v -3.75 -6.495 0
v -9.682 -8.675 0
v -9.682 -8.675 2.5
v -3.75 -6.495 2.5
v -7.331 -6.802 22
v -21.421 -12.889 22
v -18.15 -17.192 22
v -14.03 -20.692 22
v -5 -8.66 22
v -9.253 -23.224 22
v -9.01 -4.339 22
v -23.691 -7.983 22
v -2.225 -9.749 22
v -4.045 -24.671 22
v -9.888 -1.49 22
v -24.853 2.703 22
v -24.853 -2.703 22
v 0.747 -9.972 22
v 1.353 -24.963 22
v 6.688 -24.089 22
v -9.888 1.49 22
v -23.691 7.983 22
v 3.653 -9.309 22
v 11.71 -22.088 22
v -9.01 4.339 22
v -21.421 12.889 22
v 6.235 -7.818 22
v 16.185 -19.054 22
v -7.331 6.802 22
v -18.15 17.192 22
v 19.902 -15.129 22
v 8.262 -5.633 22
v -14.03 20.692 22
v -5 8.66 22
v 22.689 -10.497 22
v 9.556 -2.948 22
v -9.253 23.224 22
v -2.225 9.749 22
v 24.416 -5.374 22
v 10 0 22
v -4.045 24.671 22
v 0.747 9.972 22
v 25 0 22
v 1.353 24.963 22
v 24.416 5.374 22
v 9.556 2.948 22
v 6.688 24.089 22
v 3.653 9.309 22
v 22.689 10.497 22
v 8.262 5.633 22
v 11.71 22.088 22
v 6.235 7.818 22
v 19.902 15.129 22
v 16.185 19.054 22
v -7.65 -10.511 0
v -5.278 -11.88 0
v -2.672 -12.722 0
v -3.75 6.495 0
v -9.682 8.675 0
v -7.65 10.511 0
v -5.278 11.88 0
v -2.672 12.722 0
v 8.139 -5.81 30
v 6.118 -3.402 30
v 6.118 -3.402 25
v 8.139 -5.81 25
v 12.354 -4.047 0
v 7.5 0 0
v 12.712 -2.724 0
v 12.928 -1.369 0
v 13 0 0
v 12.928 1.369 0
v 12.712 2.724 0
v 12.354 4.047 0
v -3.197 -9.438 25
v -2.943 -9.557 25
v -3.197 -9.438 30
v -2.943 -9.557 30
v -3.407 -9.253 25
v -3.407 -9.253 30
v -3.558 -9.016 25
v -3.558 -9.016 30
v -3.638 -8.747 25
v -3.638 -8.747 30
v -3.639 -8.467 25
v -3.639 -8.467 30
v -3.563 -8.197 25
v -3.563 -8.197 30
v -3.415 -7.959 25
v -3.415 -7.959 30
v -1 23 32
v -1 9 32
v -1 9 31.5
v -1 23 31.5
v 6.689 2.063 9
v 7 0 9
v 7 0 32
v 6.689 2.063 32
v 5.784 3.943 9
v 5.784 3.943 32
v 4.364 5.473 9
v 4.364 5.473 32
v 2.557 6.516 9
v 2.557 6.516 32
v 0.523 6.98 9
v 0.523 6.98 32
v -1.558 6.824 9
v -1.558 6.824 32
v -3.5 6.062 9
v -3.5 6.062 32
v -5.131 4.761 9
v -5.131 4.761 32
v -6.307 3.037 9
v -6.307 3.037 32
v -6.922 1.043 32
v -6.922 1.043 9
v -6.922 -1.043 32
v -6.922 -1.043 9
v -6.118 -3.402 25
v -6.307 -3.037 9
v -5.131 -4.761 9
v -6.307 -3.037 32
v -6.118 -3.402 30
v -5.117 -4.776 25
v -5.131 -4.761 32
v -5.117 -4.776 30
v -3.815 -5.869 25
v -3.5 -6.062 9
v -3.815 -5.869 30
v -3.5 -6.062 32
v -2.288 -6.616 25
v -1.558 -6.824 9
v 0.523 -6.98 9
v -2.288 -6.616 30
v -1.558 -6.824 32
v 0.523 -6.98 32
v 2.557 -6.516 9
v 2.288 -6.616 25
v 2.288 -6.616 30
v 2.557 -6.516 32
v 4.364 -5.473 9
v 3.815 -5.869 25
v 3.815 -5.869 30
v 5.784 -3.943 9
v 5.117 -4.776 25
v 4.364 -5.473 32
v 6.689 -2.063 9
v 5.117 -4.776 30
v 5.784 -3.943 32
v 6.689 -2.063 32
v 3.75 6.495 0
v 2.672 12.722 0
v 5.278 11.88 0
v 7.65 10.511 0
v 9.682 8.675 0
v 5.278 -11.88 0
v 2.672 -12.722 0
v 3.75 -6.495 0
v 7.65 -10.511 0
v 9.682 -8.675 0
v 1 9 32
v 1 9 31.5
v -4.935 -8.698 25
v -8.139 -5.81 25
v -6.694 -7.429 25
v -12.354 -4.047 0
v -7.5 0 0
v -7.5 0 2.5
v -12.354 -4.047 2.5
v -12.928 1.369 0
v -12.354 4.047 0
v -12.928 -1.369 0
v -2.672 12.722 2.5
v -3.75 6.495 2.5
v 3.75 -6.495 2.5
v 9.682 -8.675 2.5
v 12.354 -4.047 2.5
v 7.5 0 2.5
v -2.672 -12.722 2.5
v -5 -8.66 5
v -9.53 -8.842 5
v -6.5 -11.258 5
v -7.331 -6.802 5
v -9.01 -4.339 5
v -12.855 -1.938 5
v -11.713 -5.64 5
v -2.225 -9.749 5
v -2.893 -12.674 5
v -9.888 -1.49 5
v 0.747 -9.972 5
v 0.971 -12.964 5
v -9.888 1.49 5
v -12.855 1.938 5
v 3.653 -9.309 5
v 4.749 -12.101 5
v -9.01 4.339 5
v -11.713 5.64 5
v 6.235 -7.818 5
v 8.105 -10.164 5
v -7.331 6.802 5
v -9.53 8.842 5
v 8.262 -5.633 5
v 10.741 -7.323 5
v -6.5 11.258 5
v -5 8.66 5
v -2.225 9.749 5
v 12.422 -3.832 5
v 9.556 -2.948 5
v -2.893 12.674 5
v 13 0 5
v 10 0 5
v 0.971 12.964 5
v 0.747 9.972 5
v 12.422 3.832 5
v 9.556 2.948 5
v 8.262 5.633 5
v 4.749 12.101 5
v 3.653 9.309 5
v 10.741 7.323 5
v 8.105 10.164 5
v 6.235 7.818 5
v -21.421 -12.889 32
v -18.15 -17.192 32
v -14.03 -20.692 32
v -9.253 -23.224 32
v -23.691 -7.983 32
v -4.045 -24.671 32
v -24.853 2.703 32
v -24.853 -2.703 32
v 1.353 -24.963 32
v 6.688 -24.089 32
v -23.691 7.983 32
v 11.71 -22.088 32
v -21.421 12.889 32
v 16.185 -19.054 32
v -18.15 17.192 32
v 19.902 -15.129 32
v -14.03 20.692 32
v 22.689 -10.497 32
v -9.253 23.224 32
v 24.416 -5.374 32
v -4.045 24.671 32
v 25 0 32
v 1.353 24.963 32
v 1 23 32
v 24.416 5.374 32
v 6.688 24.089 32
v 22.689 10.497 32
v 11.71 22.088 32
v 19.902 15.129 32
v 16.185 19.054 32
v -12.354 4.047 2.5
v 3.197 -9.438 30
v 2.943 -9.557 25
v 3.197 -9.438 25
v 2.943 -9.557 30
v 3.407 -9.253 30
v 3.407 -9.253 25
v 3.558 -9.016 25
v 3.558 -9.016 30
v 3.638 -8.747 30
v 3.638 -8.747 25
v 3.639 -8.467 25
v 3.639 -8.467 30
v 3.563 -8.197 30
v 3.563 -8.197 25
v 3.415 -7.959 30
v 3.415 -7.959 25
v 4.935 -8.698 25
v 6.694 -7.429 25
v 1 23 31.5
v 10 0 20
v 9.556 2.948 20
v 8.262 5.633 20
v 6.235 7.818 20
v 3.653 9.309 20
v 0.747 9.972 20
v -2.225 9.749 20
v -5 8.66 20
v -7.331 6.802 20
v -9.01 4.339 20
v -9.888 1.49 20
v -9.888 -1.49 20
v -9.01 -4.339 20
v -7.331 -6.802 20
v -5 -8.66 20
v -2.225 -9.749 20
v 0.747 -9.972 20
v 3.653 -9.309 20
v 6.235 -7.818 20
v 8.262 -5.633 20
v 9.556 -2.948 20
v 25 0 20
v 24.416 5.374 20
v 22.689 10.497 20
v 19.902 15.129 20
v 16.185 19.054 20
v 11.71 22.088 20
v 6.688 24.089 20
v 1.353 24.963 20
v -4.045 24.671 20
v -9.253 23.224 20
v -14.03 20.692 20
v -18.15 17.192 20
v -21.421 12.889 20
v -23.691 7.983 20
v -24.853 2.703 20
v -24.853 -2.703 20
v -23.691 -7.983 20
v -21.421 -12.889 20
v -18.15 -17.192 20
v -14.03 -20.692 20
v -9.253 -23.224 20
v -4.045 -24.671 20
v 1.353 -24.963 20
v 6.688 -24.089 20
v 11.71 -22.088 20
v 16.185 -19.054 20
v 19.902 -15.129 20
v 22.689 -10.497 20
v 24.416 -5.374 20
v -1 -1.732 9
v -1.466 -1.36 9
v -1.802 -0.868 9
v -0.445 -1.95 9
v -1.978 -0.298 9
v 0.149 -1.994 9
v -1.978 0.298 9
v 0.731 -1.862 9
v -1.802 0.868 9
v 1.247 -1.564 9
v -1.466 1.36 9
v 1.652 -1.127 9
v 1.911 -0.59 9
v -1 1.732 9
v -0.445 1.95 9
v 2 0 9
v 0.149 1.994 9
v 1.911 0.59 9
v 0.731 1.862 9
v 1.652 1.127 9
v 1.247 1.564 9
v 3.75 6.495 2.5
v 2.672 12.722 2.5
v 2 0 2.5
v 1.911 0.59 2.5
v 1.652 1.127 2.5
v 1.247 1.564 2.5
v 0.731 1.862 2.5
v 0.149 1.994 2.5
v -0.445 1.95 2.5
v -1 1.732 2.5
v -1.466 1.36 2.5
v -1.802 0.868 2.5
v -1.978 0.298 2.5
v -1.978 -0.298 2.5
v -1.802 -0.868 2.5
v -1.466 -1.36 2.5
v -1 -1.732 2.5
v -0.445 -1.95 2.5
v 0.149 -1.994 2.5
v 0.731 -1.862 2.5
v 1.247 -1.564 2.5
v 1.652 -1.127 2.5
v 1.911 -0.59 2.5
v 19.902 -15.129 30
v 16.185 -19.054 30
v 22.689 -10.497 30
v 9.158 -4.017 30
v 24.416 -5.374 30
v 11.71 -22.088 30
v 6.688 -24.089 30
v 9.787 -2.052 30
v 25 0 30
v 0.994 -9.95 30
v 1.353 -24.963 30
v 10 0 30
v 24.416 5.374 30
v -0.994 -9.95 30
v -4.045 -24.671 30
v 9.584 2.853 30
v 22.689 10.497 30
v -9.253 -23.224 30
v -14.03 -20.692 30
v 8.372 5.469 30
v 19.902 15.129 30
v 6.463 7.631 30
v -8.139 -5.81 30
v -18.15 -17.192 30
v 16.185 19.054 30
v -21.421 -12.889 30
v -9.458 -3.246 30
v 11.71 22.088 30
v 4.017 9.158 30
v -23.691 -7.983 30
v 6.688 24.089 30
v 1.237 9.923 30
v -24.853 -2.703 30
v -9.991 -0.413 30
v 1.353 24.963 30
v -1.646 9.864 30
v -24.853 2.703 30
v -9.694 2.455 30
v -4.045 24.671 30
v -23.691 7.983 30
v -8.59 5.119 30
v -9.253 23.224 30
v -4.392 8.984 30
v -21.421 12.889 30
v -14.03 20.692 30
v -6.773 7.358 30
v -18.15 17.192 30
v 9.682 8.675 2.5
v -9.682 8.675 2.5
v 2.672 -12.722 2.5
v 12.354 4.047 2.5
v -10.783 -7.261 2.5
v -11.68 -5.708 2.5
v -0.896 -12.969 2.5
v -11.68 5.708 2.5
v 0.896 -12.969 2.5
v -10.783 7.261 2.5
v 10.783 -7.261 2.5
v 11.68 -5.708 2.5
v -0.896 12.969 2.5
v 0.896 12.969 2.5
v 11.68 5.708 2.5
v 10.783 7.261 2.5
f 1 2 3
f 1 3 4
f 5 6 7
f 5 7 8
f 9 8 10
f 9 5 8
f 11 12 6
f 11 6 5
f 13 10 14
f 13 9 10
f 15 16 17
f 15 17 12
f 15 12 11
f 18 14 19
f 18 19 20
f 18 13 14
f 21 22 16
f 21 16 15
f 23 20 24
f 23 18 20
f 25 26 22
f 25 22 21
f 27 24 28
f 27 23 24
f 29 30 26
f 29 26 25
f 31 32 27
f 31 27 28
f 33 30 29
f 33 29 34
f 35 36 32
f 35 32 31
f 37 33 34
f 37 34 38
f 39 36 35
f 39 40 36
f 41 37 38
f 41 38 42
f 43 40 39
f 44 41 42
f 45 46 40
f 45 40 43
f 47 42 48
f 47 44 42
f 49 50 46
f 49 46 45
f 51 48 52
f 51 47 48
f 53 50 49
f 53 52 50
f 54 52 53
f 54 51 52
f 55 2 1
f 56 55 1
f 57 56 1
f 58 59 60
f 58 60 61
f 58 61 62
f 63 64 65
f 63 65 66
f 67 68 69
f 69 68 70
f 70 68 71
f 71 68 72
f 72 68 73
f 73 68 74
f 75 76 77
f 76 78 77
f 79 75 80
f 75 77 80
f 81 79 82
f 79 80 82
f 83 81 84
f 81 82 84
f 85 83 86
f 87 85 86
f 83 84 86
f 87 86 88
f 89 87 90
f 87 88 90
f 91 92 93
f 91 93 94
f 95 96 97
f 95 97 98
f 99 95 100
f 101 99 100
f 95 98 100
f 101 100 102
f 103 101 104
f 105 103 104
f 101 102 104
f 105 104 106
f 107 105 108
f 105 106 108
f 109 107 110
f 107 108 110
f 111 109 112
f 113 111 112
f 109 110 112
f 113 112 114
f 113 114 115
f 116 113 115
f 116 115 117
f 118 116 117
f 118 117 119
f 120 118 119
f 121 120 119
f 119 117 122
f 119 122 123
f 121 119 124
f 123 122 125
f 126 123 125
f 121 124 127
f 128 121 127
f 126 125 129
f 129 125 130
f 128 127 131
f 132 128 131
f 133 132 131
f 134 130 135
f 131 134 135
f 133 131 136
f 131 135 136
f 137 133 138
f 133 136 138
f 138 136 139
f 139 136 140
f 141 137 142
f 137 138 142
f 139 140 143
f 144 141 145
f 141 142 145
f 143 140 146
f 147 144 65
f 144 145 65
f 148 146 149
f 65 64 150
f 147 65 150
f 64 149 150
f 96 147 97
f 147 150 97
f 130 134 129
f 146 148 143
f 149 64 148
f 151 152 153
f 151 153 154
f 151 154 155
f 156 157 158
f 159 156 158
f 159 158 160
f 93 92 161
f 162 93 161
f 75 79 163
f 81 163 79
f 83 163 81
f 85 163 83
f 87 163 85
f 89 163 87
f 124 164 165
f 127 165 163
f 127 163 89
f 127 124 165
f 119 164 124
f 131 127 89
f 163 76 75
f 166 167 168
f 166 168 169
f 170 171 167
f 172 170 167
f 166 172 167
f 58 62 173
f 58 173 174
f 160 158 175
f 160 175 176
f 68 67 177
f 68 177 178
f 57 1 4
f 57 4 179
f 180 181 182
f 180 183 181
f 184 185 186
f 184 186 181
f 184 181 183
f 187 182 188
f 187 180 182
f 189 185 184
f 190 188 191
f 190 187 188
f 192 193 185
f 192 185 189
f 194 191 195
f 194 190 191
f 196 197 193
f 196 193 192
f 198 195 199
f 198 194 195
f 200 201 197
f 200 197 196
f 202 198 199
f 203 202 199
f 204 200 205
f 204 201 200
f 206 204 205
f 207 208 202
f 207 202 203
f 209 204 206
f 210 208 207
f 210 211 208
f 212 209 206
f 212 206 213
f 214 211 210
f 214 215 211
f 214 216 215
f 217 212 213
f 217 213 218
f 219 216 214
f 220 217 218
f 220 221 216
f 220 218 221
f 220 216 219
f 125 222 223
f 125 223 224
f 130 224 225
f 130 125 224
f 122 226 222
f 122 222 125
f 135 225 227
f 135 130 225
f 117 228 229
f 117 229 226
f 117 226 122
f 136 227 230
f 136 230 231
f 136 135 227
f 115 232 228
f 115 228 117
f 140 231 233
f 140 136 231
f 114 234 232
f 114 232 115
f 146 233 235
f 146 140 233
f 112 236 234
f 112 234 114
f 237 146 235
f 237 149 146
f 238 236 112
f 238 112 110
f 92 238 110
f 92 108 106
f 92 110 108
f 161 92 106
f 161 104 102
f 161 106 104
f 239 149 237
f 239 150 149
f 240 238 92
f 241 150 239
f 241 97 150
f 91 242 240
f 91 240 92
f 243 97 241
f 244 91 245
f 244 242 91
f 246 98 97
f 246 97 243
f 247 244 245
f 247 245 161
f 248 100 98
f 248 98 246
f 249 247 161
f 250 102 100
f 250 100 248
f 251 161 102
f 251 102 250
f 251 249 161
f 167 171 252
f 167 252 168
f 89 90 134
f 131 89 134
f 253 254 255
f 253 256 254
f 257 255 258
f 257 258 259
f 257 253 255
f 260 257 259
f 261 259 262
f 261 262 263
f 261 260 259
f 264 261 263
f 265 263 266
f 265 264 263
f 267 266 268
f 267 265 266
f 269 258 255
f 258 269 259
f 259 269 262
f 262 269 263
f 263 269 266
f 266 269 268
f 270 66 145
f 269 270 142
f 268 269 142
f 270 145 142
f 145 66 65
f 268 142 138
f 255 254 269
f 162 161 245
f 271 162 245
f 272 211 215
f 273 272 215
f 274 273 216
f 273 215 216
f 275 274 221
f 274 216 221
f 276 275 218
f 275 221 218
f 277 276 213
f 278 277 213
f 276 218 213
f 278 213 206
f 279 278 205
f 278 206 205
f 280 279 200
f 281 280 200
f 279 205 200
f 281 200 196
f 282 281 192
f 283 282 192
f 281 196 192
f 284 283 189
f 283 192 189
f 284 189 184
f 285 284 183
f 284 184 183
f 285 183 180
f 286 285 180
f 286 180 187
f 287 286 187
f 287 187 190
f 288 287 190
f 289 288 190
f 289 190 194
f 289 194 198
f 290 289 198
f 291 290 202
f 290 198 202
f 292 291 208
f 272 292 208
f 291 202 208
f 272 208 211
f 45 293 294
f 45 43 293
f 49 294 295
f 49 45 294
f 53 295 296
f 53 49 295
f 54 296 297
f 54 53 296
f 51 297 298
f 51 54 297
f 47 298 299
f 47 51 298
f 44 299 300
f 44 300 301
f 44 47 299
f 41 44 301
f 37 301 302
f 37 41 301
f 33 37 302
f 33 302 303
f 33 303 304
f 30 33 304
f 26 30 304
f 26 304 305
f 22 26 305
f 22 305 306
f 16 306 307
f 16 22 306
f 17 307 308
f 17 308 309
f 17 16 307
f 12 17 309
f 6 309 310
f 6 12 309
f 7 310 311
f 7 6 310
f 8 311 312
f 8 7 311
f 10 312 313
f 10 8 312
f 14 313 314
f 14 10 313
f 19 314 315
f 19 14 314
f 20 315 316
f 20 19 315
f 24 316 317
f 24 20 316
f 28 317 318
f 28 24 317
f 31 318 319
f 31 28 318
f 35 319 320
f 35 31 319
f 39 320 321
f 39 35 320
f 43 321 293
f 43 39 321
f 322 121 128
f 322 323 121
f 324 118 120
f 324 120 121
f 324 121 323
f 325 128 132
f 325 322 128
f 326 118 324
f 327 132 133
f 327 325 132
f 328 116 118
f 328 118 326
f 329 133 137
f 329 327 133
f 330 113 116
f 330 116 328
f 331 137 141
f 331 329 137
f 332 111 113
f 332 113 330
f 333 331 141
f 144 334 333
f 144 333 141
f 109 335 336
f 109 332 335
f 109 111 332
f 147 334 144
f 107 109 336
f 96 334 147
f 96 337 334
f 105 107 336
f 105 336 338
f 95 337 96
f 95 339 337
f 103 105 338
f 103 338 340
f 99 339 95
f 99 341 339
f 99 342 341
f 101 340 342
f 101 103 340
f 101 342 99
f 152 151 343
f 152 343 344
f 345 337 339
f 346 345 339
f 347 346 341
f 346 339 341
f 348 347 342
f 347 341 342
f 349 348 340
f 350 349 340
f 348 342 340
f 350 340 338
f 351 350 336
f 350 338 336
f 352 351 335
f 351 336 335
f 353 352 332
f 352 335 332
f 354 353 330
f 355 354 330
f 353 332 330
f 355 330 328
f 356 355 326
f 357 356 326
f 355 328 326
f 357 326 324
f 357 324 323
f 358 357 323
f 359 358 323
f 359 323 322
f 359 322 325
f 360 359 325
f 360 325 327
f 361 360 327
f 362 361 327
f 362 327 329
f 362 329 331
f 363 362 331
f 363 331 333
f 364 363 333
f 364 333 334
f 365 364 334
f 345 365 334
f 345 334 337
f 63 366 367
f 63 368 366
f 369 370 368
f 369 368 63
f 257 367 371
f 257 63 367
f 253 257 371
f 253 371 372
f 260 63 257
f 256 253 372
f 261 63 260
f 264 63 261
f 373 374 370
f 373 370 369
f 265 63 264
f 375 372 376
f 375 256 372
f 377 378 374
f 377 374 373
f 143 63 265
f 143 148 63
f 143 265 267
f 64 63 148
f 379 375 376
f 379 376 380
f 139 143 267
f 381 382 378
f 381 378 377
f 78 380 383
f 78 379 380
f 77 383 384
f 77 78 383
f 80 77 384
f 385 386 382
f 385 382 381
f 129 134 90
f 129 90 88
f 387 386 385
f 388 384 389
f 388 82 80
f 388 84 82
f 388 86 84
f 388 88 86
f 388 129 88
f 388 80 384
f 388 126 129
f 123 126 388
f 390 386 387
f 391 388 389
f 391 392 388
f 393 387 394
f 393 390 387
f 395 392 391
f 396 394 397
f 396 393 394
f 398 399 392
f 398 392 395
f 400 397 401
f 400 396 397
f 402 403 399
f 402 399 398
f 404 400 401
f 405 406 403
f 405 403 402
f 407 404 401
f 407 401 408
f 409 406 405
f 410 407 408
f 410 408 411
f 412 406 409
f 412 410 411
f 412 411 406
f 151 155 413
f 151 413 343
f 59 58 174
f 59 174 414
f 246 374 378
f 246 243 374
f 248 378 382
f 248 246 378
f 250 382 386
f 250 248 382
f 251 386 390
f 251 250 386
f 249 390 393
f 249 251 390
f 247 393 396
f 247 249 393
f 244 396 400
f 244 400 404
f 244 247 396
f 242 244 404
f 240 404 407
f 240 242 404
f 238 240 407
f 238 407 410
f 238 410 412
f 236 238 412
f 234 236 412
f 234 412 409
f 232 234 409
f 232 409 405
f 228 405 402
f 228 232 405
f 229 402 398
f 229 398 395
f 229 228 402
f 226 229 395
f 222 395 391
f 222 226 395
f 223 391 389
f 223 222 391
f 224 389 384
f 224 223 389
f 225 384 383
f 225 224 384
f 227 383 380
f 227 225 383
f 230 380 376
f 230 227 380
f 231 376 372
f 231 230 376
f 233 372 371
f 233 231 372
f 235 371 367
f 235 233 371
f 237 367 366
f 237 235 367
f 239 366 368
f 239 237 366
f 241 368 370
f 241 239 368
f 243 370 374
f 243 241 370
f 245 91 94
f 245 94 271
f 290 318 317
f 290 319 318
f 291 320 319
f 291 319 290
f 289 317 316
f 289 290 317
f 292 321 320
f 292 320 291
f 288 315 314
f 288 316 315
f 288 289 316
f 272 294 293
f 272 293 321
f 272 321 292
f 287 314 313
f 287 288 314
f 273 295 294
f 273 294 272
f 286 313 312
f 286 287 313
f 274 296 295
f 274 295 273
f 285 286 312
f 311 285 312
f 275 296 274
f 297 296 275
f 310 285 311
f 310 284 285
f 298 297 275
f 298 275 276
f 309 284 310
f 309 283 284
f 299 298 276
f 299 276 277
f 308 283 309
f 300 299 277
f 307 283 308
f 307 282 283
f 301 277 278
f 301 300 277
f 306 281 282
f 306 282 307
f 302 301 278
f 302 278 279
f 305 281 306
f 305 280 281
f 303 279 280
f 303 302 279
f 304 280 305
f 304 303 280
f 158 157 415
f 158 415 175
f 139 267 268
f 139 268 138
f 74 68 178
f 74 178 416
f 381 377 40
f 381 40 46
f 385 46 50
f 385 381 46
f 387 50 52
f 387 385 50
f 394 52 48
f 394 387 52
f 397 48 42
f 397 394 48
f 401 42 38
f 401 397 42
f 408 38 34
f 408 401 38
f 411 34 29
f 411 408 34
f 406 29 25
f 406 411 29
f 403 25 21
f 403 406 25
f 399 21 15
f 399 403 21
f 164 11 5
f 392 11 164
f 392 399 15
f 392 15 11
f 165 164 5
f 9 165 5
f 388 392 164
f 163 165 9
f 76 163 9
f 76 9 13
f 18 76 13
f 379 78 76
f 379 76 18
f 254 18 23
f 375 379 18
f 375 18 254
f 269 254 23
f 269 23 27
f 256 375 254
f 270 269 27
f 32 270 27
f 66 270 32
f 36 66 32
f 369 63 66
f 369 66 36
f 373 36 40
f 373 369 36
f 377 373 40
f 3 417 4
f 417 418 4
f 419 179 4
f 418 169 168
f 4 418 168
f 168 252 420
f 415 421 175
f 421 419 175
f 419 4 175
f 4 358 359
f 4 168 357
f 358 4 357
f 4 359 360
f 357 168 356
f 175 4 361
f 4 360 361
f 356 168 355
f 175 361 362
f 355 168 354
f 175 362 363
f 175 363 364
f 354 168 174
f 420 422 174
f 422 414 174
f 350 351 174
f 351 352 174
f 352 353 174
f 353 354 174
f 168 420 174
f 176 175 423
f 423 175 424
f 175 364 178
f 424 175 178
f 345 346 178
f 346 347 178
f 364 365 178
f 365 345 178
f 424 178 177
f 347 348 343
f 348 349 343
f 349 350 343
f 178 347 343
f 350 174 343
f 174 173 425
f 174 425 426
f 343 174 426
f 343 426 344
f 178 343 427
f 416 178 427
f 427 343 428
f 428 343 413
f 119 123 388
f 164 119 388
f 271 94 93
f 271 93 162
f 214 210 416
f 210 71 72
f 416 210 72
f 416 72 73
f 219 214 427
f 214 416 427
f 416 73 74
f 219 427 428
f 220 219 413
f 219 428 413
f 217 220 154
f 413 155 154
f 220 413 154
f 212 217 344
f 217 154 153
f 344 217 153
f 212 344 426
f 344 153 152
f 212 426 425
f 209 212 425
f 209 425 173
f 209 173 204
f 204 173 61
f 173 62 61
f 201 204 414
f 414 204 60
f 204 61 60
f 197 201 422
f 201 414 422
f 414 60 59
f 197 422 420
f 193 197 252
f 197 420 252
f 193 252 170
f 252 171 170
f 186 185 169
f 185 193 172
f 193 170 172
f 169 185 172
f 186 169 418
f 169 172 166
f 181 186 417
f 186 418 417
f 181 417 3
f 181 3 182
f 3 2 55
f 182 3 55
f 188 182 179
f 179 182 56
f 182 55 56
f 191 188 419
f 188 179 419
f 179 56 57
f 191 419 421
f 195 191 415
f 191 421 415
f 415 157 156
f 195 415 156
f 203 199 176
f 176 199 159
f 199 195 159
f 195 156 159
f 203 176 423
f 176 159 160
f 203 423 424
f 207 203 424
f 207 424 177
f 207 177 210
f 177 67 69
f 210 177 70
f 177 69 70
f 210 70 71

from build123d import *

# Parameters (mm, degrees)
SKETCH_3_R          = 13
EXTRUDE_1_DEPTH     = 5
CUT_EXTRUDE_2_DEPTH = 2.5
SKETCH_11_R         = 10
EXTRUDE_2_DEPTH     = 15
SKETCH_6_R          = 2
CUT_EXTRUDE_3_DEPTH = 33
SKETCH_7_R          = 7
CUT_EXTRUDE_4_DEPTH = 23
CUT_EXTRUDE_6_DEPTH = 5
FILLET_1_R          = 1
SKETCH_10_W         = 2
SKETCH_10_H         = 14
CUT_EXTRUDE_7_DEPTH = 0.5


with BuildPart() as part:
    # ｽｹｯﾁ3 → ﾎﾞｽ - 押し出し1 (new body)
    with BuildSketch(Plane.XY):
        Circle(SKETCH_3_R)
    extrude(amount=EXTRUDE_1_DEPTH)

    # ｽｹｯﾁ2 → ｶｯﾄ - 押し出し2 (cut)
    with BuildSketch(Plane.XY):
        with BuildLine():
            Line((3.75, 6.495190528), (2.463350586, 13.926501921))
            ThreePointArc((2.463350586, 13.926501921), (0, 16), (-2.463350586, 13.926501921))
            Line((-2.463350586, 13.926501921), (-3.75, 6.495190528))
            Line((-3.75, 6.495190528), (-10.829029157, 9.096575147))
            ThreePointArc((-10.829029157, 9.096575147), (-13.856406461, 8), (-13.292379743, 4.829926775))
            Line((-13.292379743, 4.829926775), (-7.5, 0))
            Line((-7.5, 0), (-13.292379743, -4.829926775))
            ThreePointArc((-13.292379743, -4.829926775), (-13.856406461, -8), (-10.829029157, -9.096575147))
            Line((-10.829029157, -9.096575147), (-3.75, -6.495190528))
            Line((-3.75, -6.495190528), (-2.463350586, -13.926501921))
            ThreePointArc((-2.463350586, -13.926501921), (0, -16), (2.463350586, -13.926501921))
            Line((2.463350586, -13.926501921), (3.75, -6.495190528))
            Line((3.75, -6.495190528), (10.829029157, -9.096575147))
            ThreePointArc((10.829029157, -9.096575147), (13.856406461, -8), (13.292379743, -4.829926775))
            Line((13.292379743, -4.829926775), (7.5, 0))
            Line((7.5, 0), (13.292379743, 4.829926775))
            ThreePointArc((13.292379743, 4.829926775), (13.856406461, 8), (10.829029157, 9.096575147))
            Line((10.829029157, 9.096575147), (3.75, 6.495190528))
        make_face()
    extrude(amount=CUT_EXTRUDE_2_DEPTH, mode=Mode.SUBTRACT)

    # ｽｹｯﾁ11 → ﾎﾞｽ - 押し出し2 (add)
    with BuildSketch(Plane.XY.offset(5)):
        Circle(SKETCH_11_R)
    extrude(amount=EXTRUDE_2_DEPTH)

    # ｽｹｯﾁ5 → 回転1 (revolve)
    with BuildSketch(Plane(origin=(0, 0, 0), x_dir=(1, 0, 0), z_dir=(0, 1, 0))):
        Polygon((0, -20), (25, -20), (25, -22), (10, -22), (10, -30), (25, -30), (25, -32), (0, -32), align=None)
    revolve(axis=Axis((0, 0, 0), (0, 0, 1)))

    # ｽｹｯﾁ6 → ｶｯﾄ - 押し出し3 (cut, through all)
    with BuildSketch(Plane.XY.offset(32)):
        Circle(SKETCH_6_R)
    extrude(amount=-CUT_EXTRUDE_3_DEPTH, mode=Mode.SUBTRACT)

    # ｽｹｯﾁ7 → ｶｯﾄ - 押し出し4 (cut)
    with BuildSketch(Plane.XY.offset(32)):
        Circle(SKETCH_7_R)
    extrude(amount=-CUT_EXTRUDE_4_DEPTH, mode=Mode.SUBTRACT)

    # ｽｹｯﾁ9 → ｶｯﾄ - 押し出し6 (cut)
    with BuildSketch(Plane(origin=(0, 0, 30), x_dir=(-1, 0, 0), z_dir=(0, 0, -1))):
        Polygon((-3.843473937, -0.691164305), (-11.556925253, -9.883697623), (-7.726703038, -13.097635671), (-0.013251721, -3.905102354), align=None)
    cut_extrude_6 = extrude(amount=CUT_EXTRUDE_6_DEPTH, mode=Mode.SUBTRACT)

    # ﾐﾗｰ1: ｶｯﾄ - 押し出し6 across plane
    add(cut_extrude_6.mirror(Plane(origin=(0, 0, 0), x_dir=(0, 0, 1), z_dir=(1, 0, 0))), mode=Mode.SUBTRACT)

    # ﾌｨﾚｯﾄ1
    fillet_1_edges = [part.edges().sort_by_distance(p)[0] for p in [
        (4.308653161, -9.024162451, 27.5),
        (-4.308653161, -9.024162451, 27.5),
    ]]
    fillet(fillet_1_edges, radius=FILLET_1_R)

    # ｽｹｯﾁ10 → ｶｯﾄ - 押し出し7 (cut)
    with BuildSketch(Plane.XY.offset(32)):
        with Locations((0, 16)):
            Rectangle(SKETCH_10_W, SKETCH_10_H)
    extrude(amount=-CUT_EXTRUDE_7_DEPTH, mode=Mode.SUBTRACT)


solid = part.part
